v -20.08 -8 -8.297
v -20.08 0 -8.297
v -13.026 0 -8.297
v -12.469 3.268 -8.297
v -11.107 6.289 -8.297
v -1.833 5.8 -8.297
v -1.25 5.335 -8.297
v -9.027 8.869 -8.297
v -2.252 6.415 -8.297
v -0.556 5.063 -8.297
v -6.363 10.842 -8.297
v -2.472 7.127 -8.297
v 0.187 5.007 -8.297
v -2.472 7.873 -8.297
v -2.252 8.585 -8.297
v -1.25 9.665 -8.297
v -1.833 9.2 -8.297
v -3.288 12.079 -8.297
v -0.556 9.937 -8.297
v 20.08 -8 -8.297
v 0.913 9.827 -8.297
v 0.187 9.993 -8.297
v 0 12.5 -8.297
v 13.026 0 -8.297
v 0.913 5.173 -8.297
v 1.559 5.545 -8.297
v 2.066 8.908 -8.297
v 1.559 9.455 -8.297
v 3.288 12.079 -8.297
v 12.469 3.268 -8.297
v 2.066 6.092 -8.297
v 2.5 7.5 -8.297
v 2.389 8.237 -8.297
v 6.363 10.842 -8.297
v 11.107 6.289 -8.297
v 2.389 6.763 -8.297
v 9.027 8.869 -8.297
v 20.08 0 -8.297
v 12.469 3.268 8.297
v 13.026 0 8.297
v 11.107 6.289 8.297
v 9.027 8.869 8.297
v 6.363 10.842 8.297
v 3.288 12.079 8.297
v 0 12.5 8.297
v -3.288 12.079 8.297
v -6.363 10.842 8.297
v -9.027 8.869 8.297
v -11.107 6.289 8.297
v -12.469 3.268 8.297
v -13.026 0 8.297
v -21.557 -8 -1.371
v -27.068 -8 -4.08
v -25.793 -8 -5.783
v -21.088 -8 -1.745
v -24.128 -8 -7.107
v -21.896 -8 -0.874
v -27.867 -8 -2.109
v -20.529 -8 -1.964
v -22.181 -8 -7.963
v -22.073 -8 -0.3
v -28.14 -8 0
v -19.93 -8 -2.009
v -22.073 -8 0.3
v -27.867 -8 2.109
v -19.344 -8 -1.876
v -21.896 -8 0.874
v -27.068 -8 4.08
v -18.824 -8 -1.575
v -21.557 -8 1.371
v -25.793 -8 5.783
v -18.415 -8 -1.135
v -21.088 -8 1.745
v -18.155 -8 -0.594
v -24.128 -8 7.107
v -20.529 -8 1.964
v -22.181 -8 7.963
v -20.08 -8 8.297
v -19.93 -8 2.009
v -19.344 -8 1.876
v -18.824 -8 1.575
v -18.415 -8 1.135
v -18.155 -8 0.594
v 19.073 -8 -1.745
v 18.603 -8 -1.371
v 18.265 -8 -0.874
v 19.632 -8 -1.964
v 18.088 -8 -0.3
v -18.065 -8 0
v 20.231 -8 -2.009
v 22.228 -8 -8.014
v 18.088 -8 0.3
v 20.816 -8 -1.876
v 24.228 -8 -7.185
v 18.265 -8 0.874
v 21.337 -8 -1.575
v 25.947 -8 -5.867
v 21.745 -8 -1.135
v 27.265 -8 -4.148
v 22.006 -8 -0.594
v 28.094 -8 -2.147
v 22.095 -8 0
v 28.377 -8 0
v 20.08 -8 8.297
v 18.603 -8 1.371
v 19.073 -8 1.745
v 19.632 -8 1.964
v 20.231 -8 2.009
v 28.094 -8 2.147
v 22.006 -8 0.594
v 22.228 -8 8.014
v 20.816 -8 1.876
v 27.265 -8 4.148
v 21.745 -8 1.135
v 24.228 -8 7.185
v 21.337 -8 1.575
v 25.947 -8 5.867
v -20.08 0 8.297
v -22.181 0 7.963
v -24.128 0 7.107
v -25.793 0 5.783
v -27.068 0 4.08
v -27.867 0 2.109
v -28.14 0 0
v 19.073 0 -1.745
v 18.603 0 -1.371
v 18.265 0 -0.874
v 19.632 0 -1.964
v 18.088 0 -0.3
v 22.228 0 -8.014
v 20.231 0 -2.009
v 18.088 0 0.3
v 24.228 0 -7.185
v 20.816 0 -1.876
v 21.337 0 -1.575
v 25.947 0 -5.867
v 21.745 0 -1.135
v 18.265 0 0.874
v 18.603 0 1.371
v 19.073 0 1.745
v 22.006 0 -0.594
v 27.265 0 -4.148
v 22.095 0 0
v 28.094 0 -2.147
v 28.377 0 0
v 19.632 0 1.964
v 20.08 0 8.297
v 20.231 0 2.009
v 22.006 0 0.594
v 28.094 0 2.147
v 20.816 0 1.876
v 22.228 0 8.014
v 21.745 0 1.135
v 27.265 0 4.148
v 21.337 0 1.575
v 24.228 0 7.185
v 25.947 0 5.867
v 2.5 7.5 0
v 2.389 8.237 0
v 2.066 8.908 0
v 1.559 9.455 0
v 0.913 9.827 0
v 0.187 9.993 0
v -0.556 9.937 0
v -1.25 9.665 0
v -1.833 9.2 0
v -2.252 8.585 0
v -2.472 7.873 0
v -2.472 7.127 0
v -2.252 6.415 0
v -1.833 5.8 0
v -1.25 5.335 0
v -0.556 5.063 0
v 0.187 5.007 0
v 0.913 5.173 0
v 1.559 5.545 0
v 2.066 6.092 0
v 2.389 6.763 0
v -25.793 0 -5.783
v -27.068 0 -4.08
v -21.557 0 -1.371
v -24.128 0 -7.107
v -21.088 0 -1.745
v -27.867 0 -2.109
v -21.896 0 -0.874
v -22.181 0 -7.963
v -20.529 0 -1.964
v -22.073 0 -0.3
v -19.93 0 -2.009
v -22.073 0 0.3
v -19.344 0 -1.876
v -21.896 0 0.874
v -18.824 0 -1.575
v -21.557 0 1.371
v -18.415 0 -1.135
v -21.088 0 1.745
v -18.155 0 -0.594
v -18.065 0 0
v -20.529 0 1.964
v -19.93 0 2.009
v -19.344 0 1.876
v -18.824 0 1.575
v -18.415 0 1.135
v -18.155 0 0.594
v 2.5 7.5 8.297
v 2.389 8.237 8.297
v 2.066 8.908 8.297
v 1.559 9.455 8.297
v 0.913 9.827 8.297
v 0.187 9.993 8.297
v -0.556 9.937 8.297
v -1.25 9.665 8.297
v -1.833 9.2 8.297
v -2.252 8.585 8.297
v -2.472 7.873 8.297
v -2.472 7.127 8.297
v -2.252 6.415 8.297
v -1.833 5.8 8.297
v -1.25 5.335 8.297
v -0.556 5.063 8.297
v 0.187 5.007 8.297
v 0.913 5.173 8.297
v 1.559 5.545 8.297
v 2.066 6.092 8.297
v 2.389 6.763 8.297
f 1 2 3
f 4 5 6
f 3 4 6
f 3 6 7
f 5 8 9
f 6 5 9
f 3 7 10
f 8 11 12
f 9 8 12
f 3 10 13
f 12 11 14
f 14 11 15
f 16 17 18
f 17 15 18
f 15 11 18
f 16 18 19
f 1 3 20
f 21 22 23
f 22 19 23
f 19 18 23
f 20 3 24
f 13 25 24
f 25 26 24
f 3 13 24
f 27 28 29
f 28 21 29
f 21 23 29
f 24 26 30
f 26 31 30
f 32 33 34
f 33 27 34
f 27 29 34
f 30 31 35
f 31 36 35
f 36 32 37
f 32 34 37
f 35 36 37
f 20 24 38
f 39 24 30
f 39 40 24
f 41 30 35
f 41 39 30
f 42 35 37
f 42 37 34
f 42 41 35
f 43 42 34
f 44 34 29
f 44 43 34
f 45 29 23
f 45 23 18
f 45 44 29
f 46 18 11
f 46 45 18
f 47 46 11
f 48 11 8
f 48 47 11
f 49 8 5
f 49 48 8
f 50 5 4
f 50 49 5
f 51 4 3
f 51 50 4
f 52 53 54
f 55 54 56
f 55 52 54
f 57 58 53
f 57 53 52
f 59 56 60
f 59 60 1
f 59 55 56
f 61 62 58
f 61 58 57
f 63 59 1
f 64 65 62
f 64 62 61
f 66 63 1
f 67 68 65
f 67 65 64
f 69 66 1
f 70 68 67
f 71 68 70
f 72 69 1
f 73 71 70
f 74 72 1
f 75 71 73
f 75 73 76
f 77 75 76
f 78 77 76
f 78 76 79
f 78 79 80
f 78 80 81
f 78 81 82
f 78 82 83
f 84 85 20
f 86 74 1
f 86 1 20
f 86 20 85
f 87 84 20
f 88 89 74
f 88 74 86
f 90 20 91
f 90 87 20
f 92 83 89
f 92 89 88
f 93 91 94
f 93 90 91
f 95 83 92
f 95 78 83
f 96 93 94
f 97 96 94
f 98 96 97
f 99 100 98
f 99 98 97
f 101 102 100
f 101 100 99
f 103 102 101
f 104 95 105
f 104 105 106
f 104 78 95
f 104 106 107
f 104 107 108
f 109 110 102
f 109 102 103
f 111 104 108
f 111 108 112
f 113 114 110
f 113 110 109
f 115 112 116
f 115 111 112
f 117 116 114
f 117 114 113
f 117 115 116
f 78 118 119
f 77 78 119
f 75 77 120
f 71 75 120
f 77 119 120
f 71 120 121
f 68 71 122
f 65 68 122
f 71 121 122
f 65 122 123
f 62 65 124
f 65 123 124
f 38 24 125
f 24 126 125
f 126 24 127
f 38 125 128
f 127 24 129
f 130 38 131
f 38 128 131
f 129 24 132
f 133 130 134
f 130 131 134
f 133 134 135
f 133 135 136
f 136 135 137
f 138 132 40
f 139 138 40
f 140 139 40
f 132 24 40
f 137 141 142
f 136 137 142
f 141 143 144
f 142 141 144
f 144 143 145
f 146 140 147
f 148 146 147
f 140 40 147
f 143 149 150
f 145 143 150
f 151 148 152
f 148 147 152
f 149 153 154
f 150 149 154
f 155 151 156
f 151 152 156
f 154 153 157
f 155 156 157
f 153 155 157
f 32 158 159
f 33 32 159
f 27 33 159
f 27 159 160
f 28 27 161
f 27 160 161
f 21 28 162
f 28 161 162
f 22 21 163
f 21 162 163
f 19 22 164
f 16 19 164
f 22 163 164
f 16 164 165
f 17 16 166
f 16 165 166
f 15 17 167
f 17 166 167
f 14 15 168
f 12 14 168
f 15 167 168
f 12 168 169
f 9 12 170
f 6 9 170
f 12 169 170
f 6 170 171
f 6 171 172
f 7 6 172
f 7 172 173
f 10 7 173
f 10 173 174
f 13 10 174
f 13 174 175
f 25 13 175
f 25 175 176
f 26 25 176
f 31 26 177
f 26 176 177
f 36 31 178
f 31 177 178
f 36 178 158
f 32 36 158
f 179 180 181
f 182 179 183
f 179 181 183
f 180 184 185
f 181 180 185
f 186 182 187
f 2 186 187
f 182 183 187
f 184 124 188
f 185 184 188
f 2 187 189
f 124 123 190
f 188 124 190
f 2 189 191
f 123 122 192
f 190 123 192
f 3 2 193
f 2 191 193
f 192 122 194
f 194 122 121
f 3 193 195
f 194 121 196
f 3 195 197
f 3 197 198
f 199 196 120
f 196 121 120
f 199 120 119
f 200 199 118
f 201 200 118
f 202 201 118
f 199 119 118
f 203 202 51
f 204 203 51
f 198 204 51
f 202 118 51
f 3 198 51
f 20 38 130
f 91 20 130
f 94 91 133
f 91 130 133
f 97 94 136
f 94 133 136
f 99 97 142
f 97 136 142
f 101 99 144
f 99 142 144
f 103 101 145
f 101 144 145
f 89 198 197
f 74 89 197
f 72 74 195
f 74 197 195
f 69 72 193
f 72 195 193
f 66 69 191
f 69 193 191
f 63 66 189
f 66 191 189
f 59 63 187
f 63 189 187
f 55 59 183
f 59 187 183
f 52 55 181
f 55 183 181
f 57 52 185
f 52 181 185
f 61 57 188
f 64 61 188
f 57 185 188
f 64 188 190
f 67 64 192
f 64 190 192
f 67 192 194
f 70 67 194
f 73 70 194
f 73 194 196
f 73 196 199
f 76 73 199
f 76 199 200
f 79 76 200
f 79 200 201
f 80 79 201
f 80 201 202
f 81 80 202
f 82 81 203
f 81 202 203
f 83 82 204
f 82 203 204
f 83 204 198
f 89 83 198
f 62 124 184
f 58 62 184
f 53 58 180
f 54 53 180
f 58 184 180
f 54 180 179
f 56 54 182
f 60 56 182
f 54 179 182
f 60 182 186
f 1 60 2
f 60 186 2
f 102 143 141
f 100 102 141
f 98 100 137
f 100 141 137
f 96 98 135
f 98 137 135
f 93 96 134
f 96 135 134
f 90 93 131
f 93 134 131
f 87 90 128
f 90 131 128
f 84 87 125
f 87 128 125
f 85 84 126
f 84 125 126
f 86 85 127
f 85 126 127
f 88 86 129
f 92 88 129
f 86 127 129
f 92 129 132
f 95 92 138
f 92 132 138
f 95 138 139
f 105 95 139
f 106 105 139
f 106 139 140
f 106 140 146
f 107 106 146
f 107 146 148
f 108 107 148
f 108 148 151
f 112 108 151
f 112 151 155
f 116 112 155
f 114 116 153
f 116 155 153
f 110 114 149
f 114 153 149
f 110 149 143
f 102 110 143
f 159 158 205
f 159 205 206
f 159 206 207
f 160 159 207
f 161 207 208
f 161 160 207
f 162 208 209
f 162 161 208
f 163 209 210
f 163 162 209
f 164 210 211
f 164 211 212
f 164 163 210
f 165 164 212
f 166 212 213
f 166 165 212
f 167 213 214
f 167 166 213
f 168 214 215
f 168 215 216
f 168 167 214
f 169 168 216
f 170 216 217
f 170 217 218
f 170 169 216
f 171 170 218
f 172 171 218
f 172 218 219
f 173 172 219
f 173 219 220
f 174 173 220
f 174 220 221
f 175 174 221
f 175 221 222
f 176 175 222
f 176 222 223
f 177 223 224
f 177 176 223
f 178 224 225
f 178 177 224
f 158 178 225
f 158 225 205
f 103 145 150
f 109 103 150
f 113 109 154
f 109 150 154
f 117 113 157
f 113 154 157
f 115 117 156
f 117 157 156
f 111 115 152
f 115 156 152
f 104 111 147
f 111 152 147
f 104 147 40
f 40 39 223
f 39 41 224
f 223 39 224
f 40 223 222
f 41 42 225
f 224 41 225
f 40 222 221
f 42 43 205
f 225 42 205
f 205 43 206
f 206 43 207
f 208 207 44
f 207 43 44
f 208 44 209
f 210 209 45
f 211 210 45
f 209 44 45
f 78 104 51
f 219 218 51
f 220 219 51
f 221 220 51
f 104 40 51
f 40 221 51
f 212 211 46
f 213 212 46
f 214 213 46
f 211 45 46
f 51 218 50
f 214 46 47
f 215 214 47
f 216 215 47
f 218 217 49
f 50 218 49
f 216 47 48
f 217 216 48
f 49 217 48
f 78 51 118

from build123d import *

# Parameters (mm, degrees)
F1_DEPTH      = 8
F2_R          = 2.5
F3_DEPTH      = 8.296516
F3_DEPTH_BACK = 8.296516


with BuildPart() as f1:
    # F0 (on Front) → F1 (new body)
    with BuildSketch(Plane.XZ):
        with BuildLine():
            Line((20.080229, 8.296516), (-20.080229, 8.296516))
            ThreePointArc((-20.080229, 8.296516), (-25.793151, 5.783339), (-28.139749, 0))
            Line((-28.139749, 0), (-22.095229, 0))
            ThreePointArc((-22.095229, 0), (-20.080229, 2.015), (-18.065229, 0))
            Line((-18.065229, 0), (18.065229, 0))
            ThreePointArc((18.065229, 0), (20.080229, 2.015), (22.095229, 0))
            Line((22.095229, 0), (28.376744, 0))
            ThreePointArc((28.376744, 0), (25.946751, 5.866522), (20.080229, 8.296516))
        make_face()
        with BuildLine():
            Line((-22.095229, 0), (-28.139749, 0))
            ThreePointArc((-28.139749, 0), (-25.793151, -5.783339), (-20.080229, -8.296516))
            Line((-20.080229, -8.296516), (20.080229, -8.296516))
            ThreePointArc((20.080229, -8.296516), (25.946751, -5.866522), (28.376744, 0))
            Line((28.376744, 0), (22.095229, 0))
            ThreePointArc((22.095229, 0), (20.080229, -2.015), (18.065229, 0))
            Line((18.065229, 0), (-18.065229, 0))
            ThreePointArc((-18.065229, 0), (-20.080229, -2.015), (-22.095229, 0))
        make_face()
    extrude(amount=F1_DEPTH)

    # F2 (on Top) → F3 (join, two sides)
    with BuildSketch(Plane.XY) as f3_sk:
        with BuildLine():
            Line((-13.025831, 0), (13.025831, 0))
            ThreePointArc((13.025831, 0), (0, 12.5), (-13.025831, 0))
        make_face()
        with Locations((0, 7.5)):
            Circle(F2_R, mode=Mode.SUBTRACT)
    extrude(amount=F3_DEPTH)
    extrude(f3_sk.sketch, amount=-F3_DEPTH_BACK)


solid = f1.part
